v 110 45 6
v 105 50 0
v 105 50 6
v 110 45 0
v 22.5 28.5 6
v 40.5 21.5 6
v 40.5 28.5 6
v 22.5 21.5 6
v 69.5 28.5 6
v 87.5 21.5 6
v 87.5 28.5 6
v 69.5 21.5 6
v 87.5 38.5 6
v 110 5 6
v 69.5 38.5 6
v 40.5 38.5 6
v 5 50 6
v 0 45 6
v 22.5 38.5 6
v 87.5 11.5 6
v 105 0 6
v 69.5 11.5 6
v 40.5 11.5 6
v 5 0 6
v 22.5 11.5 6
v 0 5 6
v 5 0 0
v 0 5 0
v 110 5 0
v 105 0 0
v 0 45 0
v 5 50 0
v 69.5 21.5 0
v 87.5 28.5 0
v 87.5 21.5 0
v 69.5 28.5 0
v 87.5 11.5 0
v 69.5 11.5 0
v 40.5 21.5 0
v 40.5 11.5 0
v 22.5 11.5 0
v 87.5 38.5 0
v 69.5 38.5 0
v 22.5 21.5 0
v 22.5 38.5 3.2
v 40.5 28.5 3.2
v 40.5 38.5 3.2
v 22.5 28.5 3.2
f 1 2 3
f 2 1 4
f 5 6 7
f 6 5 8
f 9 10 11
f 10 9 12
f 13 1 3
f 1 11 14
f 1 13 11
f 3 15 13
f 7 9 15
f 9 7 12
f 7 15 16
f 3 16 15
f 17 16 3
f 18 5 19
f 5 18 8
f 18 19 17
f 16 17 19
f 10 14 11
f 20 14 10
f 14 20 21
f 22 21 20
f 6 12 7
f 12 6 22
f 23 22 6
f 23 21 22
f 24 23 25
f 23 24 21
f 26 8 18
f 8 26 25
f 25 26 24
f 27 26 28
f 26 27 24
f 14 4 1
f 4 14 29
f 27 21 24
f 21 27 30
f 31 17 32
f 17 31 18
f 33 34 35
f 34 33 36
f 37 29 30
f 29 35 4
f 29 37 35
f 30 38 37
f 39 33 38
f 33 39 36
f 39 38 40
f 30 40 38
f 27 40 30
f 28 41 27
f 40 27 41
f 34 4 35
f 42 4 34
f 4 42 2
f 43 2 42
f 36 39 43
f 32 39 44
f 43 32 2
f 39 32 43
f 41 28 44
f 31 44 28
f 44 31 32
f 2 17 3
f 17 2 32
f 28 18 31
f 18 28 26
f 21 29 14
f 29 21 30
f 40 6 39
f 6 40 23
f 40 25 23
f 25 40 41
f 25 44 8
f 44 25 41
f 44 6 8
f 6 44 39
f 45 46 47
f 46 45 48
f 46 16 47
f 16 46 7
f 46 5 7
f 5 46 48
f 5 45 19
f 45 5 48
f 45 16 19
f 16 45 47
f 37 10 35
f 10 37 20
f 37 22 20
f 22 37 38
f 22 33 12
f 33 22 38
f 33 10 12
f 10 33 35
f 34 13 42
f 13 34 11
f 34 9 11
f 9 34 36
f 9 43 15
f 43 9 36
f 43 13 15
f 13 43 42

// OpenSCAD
$fn = 32;

// ----------------------------------------------------------------------
// Windowed plate: 4 voids, 110 x 50 x 6 mm
// ----------------------------------------------------------------------

// --- parameters (mm) ---
plate_l = 110;            // plate length, X
plate_w = 50;             // plate width, Y
plate_t = 6;              // plate thickness, Z
edge_margin = 8;          // wall from the plate edge to any window
win_l = 18;               // pocket length
win_w = 10;               // pocket width
pitch_x = 47;             // grid pitch along X
pitch_y = 17;             // grid pitch along Y
depth_1 = 6;              // depth of void 1 (full thickness = through)
depth_2 = 2.8;            // depth of void 2 (full thickness = through)
depth_3 = 6;              // depth of void 3 (full thickness = through)
depth_4 = 6;              // depth of void 4 (full thickness = through)
corner_c = 5;             // corner chamfer of the plate

profile = [[5, 0], [105, 0], [110, 5], [110, 45], [105, 50], [5, 50], [0, 45], [0, 5]];  // primary outline, 8 points, counter clockwise
void_1 = [[22.5, 11.5], [40.5, 11.5], [40.5, 21.5], [22.5, 21.5]];  // pocket at grid node 0,0, 4 points
void_2 = [[22.5, 28.5], [40.5, 28.5], [40.5, 38.5], [22.5, 38.5]];  // pocket at grid node 0,1, 4 points
void_3 = [[69.5, 11.5], [87.5, 11.5], [87.5, 21.5], [69.5, 21.5]];  // pocket at grid node 1,0, 4 points
void_4 = [[69.5, 28.5], [87.5, 28.5], [87.5, 38.5], [69.5, 38.5]];  // pocket at grid node 1,1, 4 points

// --- the one profile operation ---
difference() {
  linear_extrude(height = plate_t) polygon(points = profile);
  translate([0, 0, -1])
    linear_extrude(height = plate_t + 2) polygon(points = void_1);
  translate([0, 0, plate_t - depth_2])
    linear_extrude(height = depth_2 + 1) polygon(points = void_2);
  translate([0, 0, -1])
    linear_extrude(height = plate_t + 2) polygon(points = void_3);
  translate([0, 0, -1])
    linear_extrude(height = plate_t + 2) polygon(points = void_4);
}
